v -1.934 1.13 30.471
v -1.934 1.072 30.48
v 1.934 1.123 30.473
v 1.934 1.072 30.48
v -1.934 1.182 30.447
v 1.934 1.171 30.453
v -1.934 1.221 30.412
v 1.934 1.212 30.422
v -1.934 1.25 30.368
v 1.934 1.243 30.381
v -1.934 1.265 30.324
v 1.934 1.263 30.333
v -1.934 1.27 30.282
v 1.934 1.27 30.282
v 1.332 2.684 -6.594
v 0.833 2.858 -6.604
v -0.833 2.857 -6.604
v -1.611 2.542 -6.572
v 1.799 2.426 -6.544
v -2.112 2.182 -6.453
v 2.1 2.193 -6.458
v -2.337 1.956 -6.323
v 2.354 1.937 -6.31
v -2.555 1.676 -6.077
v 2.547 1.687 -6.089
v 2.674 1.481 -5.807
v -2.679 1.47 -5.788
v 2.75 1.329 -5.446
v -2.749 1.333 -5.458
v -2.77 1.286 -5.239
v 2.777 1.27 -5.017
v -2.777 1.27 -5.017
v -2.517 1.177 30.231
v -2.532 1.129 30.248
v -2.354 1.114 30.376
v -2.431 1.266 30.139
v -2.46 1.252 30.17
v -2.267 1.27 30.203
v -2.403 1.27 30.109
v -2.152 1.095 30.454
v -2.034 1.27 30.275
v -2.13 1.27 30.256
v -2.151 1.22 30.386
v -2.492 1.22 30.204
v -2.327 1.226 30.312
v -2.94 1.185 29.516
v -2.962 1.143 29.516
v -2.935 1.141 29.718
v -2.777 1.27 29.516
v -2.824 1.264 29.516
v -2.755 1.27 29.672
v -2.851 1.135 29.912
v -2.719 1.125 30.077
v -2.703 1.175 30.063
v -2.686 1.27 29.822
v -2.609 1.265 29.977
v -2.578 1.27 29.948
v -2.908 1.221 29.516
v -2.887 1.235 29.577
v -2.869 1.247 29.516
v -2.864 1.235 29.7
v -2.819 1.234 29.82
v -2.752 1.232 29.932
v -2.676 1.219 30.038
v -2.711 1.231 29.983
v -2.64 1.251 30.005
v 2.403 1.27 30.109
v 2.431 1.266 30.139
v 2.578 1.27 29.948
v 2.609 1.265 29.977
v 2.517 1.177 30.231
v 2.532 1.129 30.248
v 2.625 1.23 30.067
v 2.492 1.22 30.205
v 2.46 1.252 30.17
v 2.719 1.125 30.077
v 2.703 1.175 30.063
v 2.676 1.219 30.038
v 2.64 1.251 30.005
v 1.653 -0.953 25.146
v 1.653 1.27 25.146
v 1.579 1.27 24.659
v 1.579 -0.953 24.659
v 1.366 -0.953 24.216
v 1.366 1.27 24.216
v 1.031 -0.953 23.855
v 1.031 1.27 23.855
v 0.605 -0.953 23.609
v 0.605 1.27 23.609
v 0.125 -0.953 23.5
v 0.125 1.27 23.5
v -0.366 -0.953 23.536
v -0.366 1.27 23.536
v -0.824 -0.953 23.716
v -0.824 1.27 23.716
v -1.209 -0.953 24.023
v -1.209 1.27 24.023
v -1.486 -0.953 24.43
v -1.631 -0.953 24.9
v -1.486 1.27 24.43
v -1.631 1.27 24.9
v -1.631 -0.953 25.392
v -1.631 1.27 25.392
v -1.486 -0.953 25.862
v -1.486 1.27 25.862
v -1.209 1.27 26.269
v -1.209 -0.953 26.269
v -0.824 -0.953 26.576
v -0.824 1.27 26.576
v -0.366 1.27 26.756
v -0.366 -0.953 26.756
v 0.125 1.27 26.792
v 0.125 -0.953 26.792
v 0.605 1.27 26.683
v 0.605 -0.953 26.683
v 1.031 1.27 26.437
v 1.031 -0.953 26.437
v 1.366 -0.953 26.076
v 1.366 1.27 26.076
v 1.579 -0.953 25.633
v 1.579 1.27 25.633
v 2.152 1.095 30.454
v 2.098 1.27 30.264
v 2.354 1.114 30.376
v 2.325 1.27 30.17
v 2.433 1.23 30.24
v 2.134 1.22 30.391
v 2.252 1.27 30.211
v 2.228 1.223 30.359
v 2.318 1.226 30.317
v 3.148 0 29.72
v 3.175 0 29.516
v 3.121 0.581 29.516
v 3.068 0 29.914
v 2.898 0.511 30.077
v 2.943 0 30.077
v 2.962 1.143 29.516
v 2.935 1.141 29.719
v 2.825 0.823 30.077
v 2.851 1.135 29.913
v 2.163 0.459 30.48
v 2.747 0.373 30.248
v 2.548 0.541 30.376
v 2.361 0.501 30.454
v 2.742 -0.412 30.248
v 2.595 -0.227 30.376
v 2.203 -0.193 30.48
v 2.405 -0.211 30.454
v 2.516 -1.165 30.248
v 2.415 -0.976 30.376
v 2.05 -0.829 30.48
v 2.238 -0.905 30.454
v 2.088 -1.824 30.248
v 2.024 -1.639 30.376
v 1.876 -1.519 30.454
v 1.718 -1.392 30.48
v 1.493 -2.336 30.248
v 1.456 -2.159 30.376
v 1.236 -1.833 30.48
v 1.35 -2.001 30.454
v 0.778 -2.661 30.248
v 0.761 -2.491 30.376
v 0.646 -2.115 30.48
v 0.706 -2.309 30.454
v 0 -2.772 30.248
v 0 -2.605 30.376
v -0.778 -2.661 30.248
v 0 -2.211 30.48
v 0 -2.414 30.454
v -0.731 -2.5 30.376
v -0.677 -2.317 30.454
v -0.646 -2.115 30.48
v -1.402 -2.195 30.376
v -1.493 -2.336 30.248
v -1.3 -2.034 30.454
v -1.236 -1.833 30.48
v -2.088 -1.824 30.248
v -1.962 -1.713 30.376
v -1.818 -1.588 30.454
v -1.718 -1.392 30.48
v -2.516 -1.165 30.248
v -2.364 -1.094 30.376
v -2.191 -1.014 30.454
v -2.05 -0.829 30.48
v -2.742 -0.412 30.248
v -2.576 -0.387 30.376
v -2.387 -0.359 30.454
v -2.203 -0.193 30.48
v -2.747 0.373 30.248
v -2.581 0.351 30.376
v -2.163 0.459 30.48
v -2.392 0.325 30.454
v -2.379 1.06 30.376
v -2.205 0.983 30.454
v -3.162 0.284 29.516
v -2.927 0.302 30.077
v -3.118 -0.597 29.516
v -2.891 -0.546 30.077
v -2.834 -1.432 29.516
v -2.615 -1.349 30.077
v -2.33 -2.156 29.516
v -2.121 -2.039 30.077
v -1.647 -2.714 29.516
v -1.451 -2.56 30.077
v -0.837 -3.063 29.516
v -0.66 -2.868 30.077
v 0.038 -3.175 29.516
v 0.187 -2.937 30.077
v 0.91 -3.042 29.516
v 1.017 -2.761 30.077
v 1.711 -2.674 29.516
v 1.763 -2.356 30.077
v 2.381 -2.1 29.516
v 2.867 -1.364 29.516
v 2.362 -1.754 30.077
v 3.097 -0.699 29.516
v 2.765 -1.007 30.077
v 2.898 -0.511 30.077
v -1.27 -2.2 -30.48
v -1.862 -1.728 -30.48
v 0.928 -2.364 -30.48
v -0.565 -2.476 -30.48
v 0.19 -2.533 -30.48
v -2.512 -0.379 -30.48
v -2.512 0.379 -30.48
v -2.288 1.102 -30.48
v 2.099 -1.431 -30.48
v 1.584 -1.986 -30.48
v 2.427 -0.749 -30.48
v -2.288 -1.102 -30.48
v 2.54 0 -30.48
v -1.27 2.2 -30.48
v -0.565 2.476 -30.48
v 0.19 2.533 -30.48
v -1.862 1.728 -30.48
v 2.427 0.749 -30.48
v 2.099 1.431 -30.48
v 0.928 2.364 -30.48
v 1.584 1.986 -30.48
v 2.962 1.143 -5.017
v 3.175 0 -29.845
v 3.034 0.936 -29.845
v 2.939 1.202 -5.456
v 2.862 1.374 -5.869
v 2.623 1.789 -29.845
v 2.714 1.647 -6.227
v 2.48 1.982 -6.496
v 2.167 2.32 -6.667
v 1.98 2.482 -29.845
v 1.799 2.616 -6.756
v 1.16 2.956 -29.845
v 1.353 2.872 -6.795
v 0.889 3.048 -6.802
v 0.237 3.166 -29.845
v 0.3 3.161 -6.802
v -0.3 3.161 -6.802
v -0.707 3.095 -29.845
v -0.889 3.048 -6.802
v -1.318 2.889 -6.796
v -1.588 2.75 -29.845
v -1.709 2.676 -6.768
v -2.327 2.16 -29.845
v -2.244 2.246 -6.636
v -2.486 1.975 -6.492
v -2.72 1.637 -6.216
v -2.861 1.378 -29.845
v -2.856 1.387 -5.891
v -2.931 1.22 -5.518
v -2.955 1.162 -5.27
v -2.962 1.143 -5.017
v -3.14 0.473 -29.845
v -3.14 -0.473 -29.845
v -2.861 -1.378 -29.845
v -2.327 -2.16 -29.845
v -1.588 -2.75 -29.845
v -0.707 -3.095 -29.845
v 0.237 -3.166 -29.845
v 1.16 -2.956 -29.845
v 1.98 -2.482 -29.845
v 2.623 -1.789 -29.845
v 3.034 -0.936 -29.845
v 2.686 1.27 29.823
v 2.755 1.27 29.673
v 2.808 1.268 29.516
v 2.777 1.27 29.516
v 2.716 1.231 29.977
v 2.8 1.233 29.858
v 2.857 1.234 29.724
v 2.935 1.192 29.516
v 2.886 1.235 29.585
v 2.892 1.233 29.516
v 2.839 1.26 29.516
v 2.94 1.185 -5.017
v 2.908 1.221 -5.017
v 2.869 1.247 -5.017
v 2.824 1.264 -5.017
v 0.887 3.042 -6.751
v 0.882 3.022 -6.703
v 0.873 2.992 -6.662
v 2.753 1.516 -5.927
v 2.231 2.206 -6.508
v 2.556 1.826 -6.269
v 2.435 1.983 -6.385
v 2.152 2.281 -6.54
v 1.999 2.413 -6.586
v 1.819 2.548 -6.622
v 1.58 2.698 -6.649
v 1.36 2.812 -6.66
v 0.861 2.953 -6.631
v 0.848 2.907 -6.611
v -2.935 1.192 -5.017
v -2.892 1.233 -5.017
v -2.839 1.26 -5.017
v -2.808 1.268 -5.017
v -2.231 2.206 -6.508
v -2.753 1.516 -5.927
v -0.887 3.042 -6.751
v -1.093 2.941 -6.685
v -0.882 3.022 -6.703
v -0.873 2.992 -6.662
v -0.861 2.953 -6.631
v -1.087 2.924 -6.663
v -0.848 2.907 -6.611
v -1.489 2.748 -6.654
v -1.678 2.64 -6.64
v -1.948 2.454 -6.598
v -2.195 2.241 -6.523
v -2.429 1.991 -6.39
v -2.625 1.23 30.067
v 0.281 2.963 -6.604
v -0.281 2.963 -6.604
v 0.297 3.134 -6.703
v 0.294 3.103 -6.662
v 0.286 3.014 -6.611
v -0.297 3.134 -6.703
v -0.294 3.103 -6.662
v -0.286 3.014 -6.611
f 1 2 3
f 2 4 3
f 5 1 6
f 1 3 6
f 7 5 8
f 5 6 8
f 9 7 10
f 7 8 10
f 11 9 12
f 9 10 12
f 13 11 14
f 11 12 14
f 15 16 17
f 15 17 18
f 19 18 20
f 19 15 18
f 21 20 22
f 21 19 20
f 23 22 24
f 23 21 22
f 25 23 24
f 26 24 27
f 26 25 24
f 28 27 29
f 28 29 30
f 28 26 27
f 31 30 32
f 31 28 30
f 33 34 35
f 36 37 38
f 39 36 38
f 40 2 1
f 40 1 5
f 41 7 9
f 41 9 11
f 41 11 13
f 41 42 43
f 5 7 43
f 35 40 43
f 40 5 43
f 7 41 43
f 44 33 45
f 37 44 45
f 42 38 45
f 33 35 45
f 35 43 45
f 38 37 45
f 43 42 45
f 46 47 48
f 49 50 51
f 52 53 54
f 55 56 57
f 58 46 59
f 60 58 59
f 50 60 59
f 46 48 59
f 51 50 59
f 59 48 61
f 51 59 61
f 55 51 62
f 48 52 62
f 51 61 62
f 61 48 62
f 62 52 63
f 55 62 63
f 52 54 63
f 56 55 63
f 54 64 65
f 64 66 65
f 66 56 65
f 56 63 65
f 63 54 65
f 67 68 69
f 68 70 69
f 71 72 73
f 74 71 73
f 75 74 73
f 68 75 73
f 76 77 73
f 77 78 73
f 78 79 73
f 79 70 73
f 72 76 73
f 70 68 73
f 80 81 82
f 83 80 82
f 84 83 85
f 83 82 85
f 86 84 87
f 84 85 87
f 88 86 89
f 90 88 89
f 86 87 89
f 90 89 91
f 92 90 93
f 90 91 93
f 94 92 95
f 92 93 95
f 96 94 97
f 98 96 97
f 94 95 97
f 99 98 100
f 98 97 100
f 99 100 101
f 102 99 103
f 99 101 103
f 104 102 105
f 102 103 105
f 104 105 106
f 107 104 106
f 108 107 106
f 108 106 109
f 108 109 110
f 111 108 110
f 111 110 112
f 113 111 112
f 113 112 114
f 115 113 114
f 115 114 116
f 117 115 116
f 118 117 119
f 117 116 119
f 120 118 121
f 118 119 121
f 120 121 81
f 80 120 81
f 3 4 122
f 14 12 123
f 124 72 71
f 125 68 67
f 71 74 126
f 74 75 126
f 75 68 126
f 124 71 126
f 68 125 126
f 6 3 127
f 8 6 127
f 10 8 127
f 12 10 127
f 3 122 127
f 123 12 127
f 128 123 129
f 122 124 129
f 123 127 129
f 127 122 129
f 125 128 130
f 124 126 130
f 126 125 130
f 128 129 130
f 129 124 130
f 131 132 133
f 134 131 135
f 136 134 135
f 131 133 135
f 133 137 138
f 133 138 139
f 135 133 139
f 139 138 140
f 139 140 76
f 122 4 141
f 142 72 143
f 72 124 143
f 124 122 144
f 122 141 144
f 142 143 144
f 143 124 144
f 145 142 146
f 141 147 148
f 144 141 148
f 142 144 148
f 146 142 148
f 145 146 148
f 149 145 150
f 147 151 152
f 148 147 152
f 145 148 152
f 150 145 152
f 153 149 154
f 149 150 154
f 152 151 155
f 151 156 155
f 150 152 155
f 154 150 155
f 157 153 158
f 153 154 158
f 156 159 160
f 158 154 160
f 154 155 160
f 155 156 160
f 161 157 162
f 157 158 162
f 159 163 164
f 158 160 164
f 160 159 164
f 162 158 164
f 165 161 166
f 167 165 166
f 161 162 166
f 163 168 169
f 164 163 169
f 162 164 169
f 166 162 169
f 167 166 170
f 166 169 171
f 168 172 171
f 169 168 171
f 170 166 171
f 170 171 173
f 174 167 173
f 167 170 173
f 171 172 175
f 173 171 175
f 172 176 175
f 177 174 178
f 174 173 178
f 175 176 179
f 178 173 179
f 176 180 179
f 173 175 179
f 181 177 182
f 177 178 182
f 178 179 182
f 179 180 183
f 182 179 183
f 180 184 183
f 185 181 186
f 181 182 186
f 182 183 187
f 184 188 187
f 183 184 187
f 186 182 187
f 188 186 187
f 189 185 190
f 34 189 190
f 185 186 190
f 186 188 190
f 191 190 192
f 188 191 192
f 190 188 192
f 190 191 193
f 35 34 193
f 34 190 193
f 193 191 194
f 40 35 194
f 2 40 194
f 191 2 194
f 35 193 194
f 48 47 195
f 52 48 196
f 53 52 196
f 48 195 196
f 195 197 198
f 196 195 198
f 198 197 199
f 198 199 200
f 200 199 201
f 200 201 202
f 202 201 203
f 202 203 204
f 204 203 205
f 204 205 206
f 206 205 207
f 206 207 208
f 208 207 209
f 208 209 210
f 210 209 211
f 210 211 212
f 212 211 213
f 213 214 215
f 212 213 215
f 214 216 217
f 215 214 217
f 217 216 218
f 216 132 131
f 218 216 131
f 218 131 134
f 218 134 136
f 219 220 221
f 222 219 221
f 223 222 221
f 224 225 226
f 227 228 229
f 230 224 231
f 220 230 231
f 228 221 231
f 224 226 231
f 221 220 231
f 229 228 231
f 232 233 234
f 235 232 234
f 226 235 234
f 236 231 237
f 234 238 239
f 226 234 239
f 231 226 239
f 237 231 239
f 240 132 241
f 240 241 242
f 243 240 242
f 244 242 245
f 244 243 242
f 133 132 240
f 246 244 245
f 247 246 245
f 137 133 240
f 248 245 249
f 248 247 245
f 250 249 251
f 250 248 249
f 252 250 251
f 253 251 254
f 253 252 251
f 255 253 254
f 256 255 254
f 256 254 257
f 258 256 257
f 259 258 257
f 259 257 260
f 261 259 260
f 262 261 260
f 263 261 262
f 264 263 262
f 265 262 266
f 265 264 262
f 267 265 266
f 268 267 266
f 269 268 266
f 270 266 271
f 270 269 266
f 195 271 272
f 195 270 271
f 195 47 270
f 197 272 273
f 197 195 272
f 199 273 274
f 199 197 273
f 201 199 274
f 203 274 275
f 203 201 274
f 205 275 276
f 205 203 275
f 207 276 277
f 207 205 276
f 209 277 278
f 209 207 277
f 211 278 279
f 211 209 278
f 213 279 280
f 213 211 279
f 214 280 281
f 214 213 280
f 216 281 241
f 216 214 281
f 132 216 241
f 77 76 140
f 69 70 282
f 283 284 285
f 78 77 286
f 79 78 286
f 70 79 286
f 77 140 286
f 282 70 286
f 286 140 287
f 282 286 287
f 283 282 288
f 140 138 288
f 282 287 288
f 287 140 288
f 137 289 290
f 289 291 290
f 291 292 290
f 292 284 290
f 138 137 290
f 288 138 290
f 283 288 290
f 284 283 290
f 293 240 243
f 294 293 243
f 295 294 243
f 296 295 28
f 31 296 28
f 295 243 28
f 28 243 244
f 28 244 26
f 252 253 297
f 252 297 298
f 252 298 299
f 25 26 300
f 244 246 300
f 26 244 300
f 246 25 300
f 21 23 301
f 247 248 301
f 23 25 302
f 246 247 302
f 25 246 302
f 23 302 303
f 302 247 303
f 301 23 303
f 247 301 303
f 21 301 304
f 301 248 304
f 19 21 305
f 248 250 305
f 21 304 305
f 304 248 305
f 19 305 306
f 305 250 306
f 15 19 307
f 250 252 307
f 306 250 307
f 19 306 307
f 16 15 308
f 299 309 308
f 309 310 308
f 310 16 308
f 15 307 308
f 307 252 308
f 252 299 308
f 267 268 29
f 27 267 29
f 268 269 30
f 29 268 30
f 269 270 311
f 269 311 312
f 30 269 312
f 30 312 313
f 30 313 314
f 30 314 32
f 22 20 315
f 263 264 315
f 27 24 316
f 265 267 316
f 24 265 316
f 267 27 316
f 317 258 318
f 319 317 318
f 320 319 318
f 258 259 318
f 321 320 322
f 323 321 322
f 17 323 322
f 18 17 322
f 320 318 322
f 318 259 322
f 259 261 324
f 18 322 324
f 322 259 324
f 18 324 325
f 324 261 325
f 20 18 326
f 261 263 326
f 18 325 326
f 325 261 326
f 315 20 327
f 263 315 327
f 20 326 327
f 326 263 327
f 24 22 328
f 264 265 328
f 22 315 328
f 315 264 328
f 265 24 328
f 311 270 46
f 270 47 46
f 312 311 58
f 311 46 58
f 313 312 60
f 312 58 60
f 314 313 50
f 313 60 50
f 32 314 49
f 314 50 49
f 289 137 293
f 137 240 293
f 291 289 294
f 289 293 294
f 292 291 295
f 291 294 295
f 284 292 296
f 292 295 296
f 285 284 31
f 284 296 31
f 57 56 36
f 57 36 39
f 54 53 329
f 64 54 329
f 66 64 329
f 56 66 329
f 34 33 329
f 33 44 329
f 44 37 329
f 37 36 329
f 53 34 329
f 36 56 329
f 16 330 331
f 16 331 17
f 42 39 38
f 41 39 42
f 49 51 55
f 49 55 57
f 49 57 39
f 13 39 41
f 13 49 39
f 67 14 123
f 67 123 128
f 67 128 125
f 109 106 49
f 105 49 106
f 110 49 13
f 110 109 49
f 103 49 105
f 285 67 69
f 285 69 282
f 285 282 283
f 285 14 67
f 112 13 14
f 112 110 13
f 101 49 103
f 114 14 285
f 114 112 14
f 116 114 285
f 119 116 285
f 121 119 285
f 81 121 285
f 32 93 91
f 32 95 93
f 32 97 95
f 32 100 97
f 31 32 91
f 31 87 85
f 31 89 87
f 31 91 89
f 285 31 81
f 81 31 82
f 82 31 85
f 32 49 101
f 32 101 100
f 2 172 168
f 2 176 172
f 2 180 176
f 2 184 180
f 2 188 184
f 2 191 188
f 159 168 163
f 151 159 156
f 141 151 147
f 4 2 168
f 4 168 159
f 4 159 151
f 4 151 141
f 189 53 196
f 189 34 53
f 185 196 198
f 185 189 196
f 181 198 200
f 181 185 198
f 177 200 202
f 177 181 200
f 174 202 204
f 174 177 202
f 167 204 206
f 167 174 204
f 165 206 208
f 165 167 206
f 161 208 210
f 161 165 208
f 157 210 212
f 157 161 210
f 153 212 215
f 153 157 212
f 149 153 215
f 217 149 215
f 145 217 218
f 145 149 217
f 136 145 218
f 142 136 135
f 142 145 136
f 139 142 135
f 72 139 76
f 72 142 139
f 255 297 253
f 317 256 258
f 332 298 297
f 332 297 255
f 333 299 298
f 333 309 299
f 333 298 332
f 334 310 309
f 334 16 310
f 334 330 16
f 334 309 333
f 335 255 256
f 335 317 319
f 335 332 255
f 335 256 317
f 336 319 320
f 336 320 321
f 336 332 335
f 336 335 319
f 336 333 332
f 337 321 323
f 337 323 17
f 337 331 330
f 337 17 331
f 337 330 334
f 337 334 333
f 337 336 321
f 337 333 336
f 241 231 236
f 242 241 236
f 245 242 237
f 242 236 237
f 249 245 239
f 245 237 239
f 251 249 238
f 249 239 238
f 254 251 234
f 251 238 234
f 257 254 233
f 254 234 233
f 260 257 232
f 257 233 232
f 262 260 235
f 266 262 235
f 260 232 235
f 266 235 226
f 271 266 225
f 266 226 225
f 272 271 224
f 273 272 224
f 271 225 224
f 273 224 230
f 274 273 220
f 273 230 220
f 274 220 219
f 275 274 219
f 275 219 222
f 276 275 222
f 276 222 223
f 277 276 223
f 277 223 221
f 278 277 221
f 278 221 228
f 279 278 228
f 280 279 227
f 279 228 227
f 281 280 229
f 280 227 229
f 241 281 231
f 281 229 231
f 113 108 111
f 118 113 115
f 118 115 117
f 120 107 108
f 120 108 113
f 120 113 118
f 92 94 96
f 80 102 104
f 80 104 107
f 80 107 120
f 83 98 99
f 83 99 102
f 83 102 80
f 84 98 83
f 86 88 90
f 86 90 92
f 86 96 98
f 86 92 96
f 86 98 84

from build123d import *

# Parameters (mm, degrees)
SKETCH1_R          = 3.175
EXTRUDE1_DEPTH     = 30.48
CHAMFER1_SIZE      = 0.635
EXTRUDE7_DEPTH     = 38.084
FILLET1_R          = 1.5875
FILLET3_R          = 0.79375
FILLET4_R          = 0.1984375
SKETCH14_R         = 1.651
CUT_EXTRUDE1_DEPTH = 2.2225


with BuildPart() as part:
    # Sketch1 → Extrude1 (new body, symmetric)
    with BuildSketch(Plane.XY):
        Circle(SKETCH1_R)
    extrude(amount=EXTRUDE1_DEPTH, both=True)

    # Chamfer1
    chamfer1_edges = [part.edges().sort_by_distance(p)[0] for p in [
        (-3.175, 0, -30.48),
        (-3.175, 0, 30.48),
    ]]
    chamfer(chamfer1_edges, length=CHAMFER1_SIZE)

    # Sketch13 → Extrude7 (cut, through all)
    with BuildSketch(Plane.XY.offset(-6.604)):
        with BuildLine():
            Line((-2.909935566, 1.27), (2.909935566, 1.27))
            ThreePointArc((2.909935566, 1.27), (0, 3.175), (-2.909935566, 1.27))
        make_face()
    extrude(amount=EXTRUDE7_DEPTH, mode=Mode.SUBTRACT)

    # Fillet1
    fillet1_edges = [part.edges().sort_by_distance(p)[0] for p in [
        (0, 1.27, -6.604),
    ]]
    fillet(fillet1_edges, radius=FILLET1_R)

    # Fillet3
    fillet3_edges = [part.edges().sort_by_distance(p)[0] for p in [
        (0, -2.54, 30.48),
        (-0.648683119, -3.108027544, 29.845),
    ]]
    fillet(fillet3_edges, radius=FILLET3_R)

    # Fillet4
    fillet4_edges = [part.edges().sort_by_distance(p)[0] for p in [
        (0, 3.175, -6.604),
        (2.5327835, 1.914584225, -6.29363198),
        (-2.5327835, 1.914584225, -6.29363198),
        (0, 1.27, 30.48),
        (2.909935566, 1.27, 12.249858992),
        (-2.909935566, 1.27, 12.249858992),
        (-2.559573738, 1.27, 30.162672977),
        (2.559573738, 1.27, 30.162672977),
        (2.842060138, 1.27, 29.823974262),
        (-2.842060075, 1.27, 29.823974247),
        (-2.158993926, 1.27, 30.423700487),
        (2.158993926, 1.27, 30.423700487),
    ]]
    fillet(fillet4_edges, radius=FILLET4_R)

    # Sketch14 → Cut-Extrude1 (cut)
    with BuildSketch(Plane(origin=(0, 1.27, 0), x_dir=(1, 0, 0), z_dir=(0, 1, 0))):
        with Locations((0.001765627, -25.146)):
            Circle(SKETCH14_R)
    extrude(amount=-CUT_EXTRUDE1_DEPTH, mode=Mode.SUBTRACT)


solid = part.part
